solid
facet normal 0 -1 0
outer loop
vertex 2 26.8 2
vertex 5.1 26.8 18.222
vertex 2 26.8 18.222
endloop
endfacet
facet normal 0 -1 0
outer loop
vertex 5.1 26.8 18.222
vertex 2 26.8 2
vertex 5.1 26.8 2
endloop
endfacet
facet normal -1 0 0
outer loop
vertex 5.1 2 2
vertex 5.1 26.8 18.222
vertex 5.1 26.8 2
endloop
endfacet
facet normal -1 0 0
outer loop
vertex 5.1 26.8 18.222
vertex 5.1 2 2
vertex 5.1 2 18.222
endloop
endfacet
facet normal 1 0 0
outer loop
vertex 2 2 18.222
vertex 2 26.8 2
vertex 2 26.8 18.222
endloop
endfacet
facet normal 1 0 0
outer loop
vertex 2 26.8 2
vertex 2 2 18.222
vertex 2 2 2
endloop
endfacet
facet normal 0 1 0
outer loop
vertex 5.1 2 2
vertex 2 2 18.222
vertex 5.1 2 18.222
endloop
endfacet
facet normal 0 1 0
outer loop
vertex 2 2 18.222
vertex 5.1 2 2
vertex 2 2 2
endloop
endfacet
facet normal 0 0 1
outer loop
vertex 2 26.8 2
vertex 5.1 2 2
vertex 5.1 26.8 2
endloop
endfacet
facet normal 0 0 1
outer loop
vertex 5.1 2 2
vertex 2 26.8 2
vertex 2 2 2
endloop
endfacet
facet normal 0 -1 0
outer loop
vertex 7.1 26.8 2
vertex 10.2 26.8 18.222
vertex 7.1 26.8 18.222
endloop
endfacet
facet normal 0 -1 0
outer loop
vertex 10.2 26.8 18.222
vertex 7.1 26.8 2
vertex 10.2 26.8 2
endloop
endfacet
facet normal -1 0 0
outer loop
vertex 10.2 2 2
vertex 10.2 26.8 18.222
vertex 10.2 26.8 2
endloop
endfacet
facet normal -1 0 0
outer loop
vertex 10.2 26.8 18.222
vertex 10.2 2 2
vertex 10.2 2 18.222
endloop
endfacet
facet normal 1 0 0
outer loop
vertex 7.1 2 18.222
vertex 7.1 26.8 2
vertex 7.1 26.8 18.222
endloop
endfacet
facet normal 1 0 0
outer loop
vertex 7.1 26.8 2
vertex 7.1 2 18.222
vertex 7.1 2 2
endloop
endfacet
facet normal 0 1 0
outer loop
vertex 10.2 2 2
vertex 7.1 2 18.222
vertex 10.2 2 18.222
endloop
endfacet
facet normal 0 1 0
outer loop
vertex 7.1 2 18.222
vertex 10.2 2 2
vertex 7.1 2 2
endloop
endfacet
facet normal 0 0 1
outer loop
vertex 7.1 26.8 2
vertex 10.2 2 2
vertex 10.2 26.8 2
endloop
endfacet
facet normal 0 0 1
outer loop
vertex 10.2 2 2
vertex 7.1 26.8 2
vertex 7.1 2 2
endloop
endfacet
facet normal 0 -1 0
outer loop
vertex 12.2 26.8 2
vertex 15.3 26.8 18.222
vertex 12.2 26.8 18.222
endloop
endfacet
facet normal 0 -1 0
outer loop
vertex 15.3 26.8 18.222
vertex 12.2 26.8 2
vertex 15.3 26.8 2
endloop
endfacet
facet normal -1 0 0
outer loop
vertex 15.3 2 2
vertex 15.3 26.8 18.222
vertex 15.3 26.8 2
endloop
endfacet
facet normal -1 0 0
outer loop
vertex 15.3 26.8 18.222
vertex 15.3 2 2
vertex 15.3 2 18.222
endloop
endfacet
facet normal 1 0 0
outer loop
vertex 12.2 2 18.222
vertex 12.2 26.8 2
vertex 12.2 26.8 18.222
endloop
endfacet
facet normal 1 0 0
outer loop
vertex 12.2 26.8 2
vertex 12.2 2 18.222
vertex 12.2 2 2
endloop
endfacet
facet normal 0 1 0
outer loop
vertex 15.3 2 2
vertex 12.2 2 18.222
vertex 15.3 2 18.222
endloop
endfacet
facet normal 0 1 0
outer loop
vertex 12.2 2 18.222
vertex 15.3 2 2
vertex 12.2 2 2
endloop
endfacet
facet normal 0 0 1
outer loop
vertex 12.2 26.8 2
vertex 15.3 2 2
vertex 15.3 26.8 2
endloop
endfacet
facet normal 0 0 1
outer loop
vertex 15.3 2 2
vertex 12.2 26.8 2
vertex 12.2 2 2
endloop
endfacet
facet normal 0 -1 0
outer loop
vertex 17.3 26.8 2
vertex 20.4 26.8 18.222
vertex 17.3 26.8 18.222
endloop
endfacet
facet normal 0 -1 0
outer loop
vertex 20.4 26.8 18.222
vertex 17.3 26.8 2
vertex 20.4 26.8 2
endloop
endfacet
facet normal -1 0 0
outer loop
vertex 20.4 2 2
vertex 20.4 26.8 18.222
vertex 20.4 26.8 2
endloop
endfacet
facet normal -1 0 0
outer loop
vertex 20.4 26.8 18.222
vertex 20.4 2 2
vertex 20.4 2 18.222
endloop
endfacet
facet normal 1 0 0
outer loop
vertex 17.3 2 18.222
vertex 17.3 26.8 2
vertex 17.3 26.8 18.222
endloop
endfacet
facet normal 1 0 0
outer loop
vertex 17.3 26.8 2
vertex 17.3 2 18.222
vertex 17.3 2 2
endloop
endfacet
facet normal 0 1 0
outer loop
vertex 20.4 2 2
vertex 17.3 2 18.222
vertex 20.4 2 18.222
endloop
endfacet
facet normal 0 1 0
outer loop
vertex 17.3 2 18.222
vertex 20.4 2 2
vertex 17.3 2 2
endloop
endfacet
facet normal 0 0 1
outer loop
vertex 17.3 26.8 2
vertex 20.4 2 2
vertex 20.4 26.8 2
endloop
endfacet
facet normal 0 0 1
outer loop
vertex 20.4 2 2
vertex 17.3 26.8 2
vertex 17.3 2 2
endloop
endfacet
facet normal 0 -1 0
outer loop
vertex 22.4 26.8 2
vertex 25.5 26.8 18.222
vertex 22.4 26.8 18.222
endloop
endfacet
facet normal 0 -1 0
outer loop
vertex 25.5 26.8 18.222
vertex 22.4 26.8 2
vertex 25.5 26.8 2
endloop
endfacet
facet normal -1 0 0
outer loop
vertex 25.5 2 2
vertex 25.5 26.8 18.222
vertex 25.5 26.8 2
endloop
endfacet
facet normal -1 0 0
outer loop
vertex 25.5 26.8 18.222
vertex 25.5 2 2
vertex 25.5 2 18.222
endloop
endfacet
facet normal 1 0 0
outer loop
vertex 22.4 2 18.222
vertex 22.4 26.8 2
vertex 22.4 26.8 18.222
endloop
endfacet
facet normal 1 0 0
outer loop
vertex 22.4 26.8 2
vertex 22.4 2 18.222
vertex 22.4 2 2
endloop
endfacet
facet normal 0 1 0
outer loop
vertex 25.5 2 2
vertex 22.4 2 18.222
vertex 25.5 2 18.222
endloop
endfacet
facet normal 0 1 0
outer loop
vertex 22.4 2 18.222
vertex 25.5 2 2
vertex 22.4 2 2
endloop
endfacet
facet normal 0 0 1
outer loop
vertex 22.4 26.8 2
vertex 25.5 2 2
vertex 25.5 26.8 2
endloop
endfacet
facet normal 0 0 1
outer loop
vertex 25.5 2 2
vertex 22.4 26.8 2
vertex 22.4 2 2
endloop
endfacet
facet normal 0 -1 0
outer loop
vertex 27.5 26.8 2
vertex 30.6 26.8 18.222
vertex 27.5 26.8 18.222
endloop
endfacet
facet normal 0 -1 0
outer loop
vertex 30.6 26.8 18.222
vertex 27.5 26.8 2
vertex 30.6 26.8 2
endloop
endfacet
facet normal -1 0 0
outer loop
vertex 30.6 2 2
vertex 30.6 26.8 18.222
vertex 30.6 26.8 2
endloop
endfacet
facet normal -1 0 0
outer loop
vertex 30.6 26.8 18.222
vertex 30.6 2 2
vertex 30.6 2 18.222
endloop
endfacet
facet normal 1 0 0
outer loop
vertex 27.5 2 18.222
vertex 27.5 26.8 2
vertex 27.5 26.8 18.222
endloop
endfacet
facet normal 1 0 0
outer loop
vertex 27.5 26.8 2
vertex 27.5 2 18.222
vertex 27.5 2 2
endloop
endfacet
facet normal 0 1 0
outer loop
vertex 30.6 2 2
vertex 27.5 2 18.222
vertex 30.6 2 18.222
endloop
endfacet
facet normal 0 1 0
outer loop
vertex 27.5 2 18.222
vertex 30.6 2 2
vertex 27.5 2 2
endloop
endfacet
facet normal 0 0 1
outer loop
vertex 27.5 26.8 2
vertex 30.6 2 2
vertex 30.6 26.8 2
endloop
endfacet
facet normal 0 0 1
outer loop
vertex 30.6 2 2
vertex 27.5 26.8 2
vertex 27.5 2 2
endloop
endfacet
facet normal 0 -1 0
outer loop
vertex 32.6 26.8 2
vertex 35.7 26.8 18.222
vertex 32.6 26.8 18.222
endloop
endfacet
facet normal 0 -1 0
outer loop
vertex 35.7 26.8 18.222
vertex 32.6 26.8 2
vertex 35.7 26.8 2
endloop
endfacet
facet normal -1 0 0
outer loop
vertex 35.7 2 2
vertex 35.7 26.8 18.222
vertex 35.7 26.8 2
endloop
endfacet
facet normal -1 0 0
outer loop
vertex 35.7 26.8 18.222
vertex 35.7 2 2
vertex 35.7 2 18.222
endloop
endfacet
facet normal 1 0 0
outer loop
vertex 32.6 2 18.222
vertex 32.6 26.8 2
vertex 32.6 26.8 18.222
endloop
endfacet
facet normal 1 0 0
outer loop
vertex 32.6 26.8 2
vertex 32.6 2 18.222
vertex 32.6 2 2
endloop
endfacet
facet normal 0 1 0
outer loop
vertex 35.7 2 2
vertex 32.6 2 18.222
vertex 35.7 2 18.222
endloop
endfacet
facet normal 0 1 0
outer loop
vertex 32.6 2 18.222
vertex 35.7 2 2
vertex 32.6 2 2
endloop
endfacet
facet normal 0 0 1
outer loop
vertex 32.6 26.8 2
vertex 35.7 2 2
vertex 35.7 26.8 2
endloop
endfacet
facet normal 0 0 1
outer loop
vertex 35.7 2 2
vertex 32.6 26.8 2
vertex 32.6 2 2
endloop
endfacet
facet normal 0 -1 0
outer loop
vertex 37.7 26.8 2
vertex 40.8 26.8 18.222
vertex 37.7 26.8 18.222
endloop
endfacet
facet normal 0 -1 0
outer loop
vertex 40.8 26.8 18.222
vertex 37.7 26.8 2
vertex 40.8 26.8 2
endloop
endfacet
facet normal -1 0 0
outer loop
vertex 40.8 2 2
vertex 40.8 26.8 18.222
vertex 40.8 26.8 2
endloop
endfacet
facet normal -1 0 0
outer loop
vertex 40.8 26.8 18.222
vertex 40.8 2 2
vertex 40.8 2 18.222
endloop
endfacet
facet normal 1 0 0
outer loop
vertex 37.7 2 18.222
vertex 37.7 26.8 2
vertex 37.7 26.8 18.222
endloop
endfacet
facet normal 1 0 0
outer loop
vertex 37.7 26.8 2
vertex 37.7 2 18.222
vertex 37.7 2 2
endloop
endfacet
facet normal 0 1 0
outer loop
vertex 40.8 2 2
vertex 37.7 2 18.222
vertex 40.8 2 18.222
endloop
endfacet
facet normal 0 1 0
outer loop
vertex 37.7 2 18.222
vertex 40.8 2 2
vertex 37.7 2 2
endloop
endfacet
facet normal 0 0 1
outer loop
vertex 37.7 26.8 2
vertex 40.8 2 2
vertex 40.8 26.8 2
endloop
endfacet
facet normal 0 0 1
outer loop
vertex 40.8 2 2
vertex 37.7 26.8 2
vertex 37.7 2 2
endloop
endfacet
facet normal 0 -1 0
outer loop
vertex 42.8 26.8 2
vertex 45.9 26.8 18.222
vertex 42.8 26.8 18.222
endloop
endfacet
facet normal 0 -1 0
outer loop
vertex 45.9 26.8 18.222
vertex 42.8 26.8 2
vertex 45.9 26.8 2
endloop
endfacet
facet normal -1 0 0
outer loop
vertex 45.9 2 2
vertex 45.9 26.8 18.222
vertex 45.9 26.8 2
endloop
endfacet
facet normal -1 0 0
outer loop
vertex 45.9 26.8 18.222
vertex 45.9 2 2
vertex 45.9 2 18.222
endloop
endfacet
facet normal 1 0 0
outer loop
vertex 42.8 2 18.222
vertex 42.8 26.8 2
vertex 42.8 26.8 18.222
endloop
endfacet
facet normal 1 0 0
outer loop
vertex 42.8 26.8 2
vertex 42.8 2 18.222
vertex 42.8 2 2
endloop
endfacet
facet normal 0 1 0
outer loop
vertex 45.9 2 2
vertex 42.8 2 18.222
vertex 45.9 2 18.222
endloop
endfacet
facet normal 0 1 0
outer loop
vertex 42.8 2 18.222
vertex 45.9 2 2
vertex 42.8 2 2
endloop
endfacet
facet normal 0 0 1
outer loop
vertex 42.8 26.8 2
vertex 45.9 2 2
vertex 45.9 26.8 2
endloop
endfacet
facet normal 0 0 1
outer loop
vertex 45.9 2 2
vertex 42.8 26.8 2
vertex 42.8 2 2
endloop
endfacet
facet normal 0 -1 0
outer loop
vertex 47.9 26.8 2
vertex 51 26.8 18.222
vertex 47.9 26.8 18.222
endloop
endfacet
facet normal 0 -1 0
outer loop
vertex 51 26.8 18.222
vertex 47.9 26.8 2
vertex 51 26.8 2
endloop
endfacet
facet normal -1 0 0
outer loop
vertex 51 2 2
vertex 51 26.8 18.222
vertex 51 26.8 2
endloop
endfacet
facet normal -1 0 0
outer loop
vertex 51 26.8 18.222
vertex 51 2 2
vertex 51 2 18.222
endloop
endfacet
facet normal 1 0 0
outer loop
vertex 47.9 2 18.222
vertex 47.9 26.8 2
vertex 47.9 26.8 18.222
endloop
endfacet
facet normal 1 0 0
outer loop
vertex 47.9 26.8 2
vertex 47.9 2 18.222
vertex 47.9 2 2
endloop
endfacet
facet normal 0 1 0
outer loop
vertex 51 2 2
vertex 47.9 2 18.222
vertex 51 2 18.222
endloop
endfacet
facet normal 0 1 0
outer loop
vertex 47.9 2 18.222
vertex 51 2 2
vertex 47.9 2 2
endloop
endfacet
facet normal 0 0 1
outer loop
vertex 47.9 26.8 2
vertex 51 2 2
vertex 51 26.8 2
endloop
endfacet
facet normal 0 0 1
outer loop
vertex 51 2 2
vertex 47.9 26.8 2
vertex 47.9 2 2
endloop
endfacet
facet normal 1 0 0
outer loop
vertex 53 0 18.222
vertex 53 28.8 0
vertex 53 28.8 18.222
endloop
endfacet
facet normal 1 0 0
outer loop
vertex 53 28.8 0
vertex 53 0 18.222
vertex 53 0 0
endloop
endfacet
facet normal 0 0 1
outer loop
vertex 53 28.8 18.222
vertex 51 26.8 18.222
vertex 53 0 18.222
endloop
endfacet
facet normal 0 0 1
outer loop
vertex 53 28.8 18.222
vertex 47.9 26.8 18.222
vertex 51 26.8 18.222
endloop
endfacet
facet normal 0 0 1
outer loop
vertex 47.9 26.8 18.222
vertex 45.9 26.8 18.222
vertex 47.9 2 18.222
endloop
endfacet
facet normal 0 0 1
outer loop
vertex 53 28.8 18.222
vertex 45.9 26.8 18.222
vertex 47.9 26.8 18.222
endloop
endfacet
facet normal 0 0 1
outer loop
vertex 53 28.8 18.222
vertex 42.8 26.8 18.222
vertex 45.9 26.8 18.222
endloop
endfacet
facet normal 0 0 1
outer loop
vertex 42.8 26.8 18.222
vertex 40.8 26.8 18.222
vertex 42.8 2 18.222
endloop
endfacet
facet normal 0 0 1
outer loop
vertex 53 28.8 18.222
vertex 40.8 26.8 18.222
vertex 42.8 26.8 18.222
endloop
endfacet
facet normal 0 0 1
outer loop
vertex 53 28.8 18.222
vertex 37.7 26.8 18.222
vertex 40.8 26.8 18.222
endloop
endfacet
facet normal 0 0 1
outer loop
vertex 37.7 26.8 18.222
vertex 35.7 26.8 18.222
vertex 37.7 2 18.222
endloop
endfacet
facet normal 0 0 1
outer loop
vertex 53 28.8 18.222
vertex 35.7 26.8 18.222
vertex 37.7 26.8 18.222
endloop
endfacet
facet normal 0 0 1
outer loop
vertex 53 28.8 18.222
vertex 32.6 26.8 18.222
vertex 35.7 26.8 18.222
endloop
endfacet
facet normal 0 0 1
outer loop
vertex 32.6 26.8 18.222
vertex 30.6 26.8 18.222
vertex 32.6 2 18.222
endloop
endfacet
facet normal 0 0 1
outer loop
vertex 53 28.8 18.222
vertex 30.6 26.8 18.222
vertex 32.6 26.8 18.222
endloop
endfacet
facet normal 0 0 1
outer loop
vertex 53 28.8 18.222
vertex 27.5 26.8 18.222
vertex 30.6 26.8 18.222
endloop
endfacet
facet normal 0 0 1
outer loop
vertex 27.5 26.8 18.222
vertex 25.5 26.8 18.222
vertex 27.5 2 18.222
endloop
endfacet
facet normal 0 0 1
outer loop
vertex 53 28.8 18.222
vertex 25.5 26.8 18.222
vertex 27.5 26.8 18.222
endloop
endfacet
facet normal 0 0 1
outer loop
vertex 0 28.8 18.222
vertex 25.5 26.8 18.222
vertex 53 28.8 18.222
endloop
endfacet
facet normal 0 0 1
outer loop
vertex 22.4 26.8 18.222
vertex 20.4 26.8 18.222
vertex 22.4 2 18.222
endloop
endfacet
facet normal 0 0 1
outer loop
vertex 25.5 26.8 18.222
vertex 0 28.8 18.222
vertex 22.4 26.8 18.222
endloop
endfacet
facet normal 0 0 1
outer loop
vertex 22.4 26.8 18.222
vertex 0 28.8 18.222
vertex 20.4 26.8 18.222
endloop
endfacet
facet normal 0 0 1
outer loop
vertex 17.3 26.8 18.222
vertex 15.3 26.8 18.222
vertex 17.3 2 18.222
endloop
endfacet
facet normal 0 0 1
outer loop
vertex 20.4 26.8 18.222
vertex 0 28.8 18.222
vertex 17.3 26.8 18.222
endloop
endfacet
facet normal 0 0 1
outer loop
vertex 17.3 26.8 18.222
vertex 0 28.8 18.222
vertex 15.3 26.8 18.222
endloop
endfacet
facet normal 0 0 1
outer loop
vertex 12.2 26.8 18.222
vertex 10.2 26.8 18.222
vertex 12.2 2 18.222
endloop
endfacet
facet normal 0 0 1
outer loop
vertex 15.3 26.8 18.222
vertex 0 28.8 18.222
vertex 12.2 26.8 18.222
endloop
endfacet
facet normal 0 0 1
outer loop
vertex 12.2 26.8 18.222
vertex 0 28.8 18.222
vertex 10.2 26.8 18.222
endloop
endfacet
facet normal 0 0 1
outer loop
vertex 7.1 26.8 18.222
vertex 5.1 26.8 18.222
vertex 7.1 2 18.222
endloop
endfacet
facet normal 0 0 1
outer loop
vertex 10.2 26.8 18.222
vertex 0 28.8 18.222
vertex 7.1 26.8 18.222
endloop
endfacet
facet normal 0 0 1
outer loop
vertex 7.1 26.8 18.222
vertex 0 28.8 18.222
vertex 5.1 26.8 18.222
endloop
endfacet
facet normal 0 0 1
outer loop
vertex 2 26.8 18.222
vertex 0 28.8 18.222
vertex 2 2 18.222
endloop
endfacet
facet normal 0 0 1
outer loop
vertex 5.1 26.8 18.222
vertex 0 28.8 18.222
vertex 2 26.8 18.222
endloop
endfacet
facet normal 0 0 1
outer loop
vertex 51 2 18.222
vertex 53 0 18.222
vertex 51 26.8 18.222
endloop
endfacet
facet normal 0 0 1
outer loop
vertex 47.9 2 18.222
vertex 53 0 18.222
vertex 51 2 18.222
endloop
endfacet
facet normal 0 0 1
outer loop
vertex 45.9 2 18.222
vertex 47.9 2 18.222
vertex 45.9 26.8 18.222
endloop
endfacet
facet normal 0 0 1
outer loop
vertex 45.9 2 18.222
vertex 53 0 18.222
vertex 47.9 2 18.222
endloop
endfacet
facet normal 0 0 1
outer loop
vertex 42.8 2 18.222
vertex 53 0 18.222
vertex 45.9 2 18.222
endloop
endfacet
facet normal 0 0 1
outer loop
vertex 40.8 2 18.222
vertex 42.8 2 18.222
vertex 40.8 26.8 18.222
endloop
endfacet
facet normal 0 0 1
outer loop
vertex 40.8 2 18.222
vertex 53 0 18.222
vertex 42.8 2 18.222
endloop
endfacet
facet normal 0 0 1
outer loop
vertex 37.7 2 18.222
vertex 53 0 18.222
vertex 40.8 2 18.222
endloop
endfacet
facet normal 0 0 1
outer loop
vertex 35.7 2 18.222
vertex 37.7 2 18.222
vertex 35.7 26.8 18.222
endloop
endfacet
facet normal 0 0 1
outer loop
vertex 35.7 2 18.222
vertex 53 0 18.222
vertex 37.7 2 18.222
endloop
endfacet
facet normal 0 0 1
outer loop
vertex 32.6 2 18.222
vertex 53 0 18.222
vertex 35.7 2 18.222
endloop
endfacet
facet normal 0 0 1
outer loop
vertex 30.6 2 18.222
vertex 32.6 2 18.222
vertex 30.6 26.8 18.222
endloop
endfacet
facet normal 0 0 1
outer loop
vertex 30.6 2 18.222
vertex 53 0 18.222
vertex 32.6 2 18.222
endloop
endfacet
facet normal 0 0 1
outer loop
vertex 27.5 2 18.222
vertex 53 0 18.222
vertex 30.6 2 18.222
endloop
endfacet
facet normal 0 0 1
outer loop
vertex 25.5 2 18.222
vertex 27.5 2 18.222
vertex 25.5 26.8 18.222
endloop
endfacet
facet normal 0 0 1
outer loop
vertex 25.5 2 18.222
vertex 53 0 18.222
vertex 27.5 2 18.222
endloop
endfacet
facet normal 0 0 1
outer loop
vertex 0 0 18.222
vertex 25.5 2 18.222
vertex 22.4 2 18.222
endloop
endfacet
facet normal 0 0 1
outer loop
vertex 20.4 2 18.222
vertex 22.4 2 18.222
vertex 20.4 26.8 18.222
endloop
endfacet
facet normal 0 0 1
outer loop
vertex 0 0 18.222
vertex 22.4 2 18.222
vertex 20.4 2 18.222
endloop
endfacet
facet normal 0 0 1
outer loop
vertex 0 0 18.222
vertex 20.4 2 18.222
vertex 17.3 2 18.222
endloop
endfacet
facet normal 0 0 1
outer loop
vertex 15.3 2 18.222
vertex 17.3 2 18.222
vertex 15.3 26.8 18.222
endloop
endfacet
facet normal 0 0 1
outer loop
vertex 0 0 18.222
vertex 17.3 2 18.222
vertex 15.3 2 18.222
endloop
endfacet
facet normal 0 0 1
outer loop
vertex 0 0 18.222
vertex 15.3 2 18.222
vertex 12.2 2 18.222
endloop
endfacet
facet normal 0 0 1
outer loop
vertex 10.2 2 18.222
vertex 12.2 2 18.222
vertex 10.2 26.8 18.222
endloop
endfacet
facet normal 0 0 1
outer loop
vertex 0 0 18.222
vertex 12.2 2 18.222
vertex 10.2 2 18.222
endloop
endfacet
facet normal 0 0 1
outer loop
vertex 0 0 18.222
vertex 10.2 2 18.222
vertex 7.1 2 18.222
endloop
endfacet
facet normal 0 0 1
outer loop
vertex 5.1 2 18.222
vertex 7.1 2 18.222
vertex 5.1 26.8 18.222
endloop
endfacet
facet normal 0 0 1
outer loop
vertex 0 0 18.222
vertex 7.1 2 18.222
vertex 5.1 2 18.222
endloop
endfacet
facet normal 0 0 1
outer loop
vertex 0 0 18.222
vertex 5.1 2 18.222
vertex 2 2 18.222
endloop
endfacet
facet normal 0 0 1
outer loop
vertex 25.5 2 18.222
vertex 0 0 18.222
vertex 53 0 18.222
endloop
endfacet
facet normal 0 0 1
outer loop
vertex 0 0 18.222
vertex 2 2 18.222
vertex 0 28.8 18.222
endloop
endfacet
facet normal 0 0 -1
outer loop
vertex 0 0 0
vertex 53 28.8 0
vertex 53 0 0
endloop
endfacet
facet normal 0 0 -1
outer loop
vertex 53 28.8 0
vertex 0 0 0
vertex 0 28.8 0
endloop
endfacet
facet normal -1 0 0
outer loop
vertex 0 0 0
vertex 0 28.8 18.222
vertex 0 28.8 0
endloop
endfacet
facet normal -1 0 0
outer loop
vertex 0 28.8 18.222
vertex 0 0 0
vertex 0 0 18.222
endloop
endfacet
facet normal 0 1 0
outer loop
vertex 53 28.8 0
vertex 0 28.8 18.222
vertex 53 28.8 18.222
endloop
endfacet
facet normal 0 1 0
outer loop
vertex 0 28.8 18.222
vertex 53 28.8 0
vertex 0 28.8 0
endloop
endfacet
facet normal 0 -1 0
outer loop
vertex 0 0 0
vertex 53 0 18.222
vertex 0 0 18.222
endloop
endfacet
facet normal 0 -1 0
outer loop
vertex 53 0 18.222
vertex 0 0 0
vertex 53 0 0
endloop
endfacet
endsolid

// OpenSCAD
$fn = 42;

difference(){
	union() {
		union() {
			union() {
				union() {
					union() {
						union() {
							union() {
								union() {
									union() {
										union() {
											cube(size = [53.0000000000, 28.8000000000, 18.2222222222]);
											translate(v = [2, 0, 0]) {
											}
										}
										translate(v = [7.1000000000, 0, 0]) {
										}
									}
									translate(v = [12.2000000000, 0, 0]) {
									}
								}
								translate(v = [17.3000000000, 0, 0]) {
								}
							}
							translate(v = [22.4000000000, 0, 0]) {
							}
						}
						translate(v = [27.5000000000, 0, 0]) {
						}
					}
					translate(v = [32.6000000000, 0, 0]) {
					}
				}
				translate(v = [37.7000000000, 0, 0]) {
				}
			}
			translate(v = [42.8000000000, 0, 0]) {
			}
		}
		translate(v = [47.9000000000, 0, 0]) {
		}
	}
	/* Holes Below*/
	union(){
		union(){
			union(){
				union(){
					union(){
						union(){
							union(){
								union(){
									union(){
										union(){
											translate(v = [2, 0, 0]){
												translate(v = [0, 2, 0]) {
													translate(v = [0, 0, 2]) {
														rotate(a = [90, 0, 90]) {
															cube(size = [24.8000000000, 32.8000000000, 3.1000000000]);
														}
													}
												}
											}
										}
										translate(v = [7.1000000000, 0, 0]){
											translate(v = [0, 2, 0]) {
												translate(v = [0, 0, 2]) {
													rotate(a = [90, 0, 90]) {
														cube(size = [24.8000000000, 32.8000000000, 3.1000000000]);
													}
												}
											}
										}
									}
									translate(v = [12.2000000000, 0, 0]){
										translate(v = [0, 2, 0]) {
											translate(v = [0, 0, 2]) {
												rotate(a = [90, 0, 90]) {
													cube(size = [24.8000000000, 32.8000000000, 3.1000000000]);
												}
											}
										}
									}
								}
								translate(v = [17.3000000000, 0, 0]){
									translate(v = [0, 2, 0]) {
										translate(v = [0, 0, 2]) {
											rotate(a = [90, 0, 90]) {
												cube(size = [24.8000000000, 32.8000000000, 3.1000000000]);
											}
										}
									}
								}
							}
							translate(v = [22.4000000000, 0, 0]){
								translate(v = [0, 2, 0]) {
									translate(v = [0, 0, 2]) {
										rotate(a = [90, 0, 90]) {
											cube(size = [24.8000000000, 32.8000000000, 3.1000000000]);
										}
									}
								}
							}
						}
						translate(v = [27.5000000000, 0, 0]){
							translate(v = [0, 2, 0]) {
								translate(v = [0, 0, 2]) {
									rotate(a = [90, 0, 90]) {
										cube(size = [24.8000000000, 32.8000000000, 3.1000000000]);
									}
								}
							}
						}
					}
					translate(v = [32.6000000000, 0, 0]){
						translate(v = [0, 2, 0]) {
							translate(v = [0, 0, 2]) {
								rotate(a = [90, 0, 90]) {
									cube(size = [24.8000000000, 32.8000000000, 3.1000000000]);
								}
							}
						}
					}
				}
				translate(v = [37.7000000000, 0, 0]){
					translate(v = [0, 2, 0]) {
						translate(v = [0, 0, 2]) {
							rotate(a = [90, 0, 90]) {
								cube(size = [24.8000000000, 32.8000000000, 3.1000000000]);
							}
						}
					}
				}
			}
			translate(v = [42.8000000000, 0, 0]){
				translate(v = [0, 2, 0]) {
					translate(v = [0, 0, 2]) {
						rotate(a = [90, 0, 90]) {
							cube(size = [24.8000000000, 32.8000000000, 3.1000000000]);
						}
					}
				}
			}
		}
		translate(v = [47.9000000000, 0, 0]){
			translate(v = [0, 2, 0]) {
				translate(v = [0, 0, 2]) {
					rotate(a = [90, 0, 90]) {
						cube(size = [24.8000000000, 32.8000000000, 3.1000000000]);
					}
				}
			}
		}
	} /* End Holes */ 
}
/***********************************************
*********      SolidPython code:      **********
************************************************
 
from os.path import join
from solid.utils import *
from sd_card import SDCard

SEGMENTS = 42
NAME = "sd_holder.scad"


class SDCardHolder:
    def __init__(self, slots=10):
        self.sd_card = SDCard(1)
        self.slots = slots

    def generate_steps(self):
        s = 0
        for i in range(0, self.slots):
            if i == 0:
                s += 2
            else:
                s += self.sd_card.height
                s += 2
            yield s

    def assemble(self):
        base = cube([self.sd_card.height * self.slots + self.slots * 2 + 2,
                     self.sd_card.width + 4,
                     self.sd_card.length / 1.8])
        slot = forward(2)(up(2)(rotate([90, 0, 90])(self.sd_card.assemble())))
        for s in self.generate_steps():
            base += right(s)(hole()(slot))

        return base


if __name__ == '__main__':
    scad_render_to_file(SDCardHolder().assemble(), join('./out/', NAME), file_header='$fn = %s;' % SEGMENTS)
 
 
************************************************/
